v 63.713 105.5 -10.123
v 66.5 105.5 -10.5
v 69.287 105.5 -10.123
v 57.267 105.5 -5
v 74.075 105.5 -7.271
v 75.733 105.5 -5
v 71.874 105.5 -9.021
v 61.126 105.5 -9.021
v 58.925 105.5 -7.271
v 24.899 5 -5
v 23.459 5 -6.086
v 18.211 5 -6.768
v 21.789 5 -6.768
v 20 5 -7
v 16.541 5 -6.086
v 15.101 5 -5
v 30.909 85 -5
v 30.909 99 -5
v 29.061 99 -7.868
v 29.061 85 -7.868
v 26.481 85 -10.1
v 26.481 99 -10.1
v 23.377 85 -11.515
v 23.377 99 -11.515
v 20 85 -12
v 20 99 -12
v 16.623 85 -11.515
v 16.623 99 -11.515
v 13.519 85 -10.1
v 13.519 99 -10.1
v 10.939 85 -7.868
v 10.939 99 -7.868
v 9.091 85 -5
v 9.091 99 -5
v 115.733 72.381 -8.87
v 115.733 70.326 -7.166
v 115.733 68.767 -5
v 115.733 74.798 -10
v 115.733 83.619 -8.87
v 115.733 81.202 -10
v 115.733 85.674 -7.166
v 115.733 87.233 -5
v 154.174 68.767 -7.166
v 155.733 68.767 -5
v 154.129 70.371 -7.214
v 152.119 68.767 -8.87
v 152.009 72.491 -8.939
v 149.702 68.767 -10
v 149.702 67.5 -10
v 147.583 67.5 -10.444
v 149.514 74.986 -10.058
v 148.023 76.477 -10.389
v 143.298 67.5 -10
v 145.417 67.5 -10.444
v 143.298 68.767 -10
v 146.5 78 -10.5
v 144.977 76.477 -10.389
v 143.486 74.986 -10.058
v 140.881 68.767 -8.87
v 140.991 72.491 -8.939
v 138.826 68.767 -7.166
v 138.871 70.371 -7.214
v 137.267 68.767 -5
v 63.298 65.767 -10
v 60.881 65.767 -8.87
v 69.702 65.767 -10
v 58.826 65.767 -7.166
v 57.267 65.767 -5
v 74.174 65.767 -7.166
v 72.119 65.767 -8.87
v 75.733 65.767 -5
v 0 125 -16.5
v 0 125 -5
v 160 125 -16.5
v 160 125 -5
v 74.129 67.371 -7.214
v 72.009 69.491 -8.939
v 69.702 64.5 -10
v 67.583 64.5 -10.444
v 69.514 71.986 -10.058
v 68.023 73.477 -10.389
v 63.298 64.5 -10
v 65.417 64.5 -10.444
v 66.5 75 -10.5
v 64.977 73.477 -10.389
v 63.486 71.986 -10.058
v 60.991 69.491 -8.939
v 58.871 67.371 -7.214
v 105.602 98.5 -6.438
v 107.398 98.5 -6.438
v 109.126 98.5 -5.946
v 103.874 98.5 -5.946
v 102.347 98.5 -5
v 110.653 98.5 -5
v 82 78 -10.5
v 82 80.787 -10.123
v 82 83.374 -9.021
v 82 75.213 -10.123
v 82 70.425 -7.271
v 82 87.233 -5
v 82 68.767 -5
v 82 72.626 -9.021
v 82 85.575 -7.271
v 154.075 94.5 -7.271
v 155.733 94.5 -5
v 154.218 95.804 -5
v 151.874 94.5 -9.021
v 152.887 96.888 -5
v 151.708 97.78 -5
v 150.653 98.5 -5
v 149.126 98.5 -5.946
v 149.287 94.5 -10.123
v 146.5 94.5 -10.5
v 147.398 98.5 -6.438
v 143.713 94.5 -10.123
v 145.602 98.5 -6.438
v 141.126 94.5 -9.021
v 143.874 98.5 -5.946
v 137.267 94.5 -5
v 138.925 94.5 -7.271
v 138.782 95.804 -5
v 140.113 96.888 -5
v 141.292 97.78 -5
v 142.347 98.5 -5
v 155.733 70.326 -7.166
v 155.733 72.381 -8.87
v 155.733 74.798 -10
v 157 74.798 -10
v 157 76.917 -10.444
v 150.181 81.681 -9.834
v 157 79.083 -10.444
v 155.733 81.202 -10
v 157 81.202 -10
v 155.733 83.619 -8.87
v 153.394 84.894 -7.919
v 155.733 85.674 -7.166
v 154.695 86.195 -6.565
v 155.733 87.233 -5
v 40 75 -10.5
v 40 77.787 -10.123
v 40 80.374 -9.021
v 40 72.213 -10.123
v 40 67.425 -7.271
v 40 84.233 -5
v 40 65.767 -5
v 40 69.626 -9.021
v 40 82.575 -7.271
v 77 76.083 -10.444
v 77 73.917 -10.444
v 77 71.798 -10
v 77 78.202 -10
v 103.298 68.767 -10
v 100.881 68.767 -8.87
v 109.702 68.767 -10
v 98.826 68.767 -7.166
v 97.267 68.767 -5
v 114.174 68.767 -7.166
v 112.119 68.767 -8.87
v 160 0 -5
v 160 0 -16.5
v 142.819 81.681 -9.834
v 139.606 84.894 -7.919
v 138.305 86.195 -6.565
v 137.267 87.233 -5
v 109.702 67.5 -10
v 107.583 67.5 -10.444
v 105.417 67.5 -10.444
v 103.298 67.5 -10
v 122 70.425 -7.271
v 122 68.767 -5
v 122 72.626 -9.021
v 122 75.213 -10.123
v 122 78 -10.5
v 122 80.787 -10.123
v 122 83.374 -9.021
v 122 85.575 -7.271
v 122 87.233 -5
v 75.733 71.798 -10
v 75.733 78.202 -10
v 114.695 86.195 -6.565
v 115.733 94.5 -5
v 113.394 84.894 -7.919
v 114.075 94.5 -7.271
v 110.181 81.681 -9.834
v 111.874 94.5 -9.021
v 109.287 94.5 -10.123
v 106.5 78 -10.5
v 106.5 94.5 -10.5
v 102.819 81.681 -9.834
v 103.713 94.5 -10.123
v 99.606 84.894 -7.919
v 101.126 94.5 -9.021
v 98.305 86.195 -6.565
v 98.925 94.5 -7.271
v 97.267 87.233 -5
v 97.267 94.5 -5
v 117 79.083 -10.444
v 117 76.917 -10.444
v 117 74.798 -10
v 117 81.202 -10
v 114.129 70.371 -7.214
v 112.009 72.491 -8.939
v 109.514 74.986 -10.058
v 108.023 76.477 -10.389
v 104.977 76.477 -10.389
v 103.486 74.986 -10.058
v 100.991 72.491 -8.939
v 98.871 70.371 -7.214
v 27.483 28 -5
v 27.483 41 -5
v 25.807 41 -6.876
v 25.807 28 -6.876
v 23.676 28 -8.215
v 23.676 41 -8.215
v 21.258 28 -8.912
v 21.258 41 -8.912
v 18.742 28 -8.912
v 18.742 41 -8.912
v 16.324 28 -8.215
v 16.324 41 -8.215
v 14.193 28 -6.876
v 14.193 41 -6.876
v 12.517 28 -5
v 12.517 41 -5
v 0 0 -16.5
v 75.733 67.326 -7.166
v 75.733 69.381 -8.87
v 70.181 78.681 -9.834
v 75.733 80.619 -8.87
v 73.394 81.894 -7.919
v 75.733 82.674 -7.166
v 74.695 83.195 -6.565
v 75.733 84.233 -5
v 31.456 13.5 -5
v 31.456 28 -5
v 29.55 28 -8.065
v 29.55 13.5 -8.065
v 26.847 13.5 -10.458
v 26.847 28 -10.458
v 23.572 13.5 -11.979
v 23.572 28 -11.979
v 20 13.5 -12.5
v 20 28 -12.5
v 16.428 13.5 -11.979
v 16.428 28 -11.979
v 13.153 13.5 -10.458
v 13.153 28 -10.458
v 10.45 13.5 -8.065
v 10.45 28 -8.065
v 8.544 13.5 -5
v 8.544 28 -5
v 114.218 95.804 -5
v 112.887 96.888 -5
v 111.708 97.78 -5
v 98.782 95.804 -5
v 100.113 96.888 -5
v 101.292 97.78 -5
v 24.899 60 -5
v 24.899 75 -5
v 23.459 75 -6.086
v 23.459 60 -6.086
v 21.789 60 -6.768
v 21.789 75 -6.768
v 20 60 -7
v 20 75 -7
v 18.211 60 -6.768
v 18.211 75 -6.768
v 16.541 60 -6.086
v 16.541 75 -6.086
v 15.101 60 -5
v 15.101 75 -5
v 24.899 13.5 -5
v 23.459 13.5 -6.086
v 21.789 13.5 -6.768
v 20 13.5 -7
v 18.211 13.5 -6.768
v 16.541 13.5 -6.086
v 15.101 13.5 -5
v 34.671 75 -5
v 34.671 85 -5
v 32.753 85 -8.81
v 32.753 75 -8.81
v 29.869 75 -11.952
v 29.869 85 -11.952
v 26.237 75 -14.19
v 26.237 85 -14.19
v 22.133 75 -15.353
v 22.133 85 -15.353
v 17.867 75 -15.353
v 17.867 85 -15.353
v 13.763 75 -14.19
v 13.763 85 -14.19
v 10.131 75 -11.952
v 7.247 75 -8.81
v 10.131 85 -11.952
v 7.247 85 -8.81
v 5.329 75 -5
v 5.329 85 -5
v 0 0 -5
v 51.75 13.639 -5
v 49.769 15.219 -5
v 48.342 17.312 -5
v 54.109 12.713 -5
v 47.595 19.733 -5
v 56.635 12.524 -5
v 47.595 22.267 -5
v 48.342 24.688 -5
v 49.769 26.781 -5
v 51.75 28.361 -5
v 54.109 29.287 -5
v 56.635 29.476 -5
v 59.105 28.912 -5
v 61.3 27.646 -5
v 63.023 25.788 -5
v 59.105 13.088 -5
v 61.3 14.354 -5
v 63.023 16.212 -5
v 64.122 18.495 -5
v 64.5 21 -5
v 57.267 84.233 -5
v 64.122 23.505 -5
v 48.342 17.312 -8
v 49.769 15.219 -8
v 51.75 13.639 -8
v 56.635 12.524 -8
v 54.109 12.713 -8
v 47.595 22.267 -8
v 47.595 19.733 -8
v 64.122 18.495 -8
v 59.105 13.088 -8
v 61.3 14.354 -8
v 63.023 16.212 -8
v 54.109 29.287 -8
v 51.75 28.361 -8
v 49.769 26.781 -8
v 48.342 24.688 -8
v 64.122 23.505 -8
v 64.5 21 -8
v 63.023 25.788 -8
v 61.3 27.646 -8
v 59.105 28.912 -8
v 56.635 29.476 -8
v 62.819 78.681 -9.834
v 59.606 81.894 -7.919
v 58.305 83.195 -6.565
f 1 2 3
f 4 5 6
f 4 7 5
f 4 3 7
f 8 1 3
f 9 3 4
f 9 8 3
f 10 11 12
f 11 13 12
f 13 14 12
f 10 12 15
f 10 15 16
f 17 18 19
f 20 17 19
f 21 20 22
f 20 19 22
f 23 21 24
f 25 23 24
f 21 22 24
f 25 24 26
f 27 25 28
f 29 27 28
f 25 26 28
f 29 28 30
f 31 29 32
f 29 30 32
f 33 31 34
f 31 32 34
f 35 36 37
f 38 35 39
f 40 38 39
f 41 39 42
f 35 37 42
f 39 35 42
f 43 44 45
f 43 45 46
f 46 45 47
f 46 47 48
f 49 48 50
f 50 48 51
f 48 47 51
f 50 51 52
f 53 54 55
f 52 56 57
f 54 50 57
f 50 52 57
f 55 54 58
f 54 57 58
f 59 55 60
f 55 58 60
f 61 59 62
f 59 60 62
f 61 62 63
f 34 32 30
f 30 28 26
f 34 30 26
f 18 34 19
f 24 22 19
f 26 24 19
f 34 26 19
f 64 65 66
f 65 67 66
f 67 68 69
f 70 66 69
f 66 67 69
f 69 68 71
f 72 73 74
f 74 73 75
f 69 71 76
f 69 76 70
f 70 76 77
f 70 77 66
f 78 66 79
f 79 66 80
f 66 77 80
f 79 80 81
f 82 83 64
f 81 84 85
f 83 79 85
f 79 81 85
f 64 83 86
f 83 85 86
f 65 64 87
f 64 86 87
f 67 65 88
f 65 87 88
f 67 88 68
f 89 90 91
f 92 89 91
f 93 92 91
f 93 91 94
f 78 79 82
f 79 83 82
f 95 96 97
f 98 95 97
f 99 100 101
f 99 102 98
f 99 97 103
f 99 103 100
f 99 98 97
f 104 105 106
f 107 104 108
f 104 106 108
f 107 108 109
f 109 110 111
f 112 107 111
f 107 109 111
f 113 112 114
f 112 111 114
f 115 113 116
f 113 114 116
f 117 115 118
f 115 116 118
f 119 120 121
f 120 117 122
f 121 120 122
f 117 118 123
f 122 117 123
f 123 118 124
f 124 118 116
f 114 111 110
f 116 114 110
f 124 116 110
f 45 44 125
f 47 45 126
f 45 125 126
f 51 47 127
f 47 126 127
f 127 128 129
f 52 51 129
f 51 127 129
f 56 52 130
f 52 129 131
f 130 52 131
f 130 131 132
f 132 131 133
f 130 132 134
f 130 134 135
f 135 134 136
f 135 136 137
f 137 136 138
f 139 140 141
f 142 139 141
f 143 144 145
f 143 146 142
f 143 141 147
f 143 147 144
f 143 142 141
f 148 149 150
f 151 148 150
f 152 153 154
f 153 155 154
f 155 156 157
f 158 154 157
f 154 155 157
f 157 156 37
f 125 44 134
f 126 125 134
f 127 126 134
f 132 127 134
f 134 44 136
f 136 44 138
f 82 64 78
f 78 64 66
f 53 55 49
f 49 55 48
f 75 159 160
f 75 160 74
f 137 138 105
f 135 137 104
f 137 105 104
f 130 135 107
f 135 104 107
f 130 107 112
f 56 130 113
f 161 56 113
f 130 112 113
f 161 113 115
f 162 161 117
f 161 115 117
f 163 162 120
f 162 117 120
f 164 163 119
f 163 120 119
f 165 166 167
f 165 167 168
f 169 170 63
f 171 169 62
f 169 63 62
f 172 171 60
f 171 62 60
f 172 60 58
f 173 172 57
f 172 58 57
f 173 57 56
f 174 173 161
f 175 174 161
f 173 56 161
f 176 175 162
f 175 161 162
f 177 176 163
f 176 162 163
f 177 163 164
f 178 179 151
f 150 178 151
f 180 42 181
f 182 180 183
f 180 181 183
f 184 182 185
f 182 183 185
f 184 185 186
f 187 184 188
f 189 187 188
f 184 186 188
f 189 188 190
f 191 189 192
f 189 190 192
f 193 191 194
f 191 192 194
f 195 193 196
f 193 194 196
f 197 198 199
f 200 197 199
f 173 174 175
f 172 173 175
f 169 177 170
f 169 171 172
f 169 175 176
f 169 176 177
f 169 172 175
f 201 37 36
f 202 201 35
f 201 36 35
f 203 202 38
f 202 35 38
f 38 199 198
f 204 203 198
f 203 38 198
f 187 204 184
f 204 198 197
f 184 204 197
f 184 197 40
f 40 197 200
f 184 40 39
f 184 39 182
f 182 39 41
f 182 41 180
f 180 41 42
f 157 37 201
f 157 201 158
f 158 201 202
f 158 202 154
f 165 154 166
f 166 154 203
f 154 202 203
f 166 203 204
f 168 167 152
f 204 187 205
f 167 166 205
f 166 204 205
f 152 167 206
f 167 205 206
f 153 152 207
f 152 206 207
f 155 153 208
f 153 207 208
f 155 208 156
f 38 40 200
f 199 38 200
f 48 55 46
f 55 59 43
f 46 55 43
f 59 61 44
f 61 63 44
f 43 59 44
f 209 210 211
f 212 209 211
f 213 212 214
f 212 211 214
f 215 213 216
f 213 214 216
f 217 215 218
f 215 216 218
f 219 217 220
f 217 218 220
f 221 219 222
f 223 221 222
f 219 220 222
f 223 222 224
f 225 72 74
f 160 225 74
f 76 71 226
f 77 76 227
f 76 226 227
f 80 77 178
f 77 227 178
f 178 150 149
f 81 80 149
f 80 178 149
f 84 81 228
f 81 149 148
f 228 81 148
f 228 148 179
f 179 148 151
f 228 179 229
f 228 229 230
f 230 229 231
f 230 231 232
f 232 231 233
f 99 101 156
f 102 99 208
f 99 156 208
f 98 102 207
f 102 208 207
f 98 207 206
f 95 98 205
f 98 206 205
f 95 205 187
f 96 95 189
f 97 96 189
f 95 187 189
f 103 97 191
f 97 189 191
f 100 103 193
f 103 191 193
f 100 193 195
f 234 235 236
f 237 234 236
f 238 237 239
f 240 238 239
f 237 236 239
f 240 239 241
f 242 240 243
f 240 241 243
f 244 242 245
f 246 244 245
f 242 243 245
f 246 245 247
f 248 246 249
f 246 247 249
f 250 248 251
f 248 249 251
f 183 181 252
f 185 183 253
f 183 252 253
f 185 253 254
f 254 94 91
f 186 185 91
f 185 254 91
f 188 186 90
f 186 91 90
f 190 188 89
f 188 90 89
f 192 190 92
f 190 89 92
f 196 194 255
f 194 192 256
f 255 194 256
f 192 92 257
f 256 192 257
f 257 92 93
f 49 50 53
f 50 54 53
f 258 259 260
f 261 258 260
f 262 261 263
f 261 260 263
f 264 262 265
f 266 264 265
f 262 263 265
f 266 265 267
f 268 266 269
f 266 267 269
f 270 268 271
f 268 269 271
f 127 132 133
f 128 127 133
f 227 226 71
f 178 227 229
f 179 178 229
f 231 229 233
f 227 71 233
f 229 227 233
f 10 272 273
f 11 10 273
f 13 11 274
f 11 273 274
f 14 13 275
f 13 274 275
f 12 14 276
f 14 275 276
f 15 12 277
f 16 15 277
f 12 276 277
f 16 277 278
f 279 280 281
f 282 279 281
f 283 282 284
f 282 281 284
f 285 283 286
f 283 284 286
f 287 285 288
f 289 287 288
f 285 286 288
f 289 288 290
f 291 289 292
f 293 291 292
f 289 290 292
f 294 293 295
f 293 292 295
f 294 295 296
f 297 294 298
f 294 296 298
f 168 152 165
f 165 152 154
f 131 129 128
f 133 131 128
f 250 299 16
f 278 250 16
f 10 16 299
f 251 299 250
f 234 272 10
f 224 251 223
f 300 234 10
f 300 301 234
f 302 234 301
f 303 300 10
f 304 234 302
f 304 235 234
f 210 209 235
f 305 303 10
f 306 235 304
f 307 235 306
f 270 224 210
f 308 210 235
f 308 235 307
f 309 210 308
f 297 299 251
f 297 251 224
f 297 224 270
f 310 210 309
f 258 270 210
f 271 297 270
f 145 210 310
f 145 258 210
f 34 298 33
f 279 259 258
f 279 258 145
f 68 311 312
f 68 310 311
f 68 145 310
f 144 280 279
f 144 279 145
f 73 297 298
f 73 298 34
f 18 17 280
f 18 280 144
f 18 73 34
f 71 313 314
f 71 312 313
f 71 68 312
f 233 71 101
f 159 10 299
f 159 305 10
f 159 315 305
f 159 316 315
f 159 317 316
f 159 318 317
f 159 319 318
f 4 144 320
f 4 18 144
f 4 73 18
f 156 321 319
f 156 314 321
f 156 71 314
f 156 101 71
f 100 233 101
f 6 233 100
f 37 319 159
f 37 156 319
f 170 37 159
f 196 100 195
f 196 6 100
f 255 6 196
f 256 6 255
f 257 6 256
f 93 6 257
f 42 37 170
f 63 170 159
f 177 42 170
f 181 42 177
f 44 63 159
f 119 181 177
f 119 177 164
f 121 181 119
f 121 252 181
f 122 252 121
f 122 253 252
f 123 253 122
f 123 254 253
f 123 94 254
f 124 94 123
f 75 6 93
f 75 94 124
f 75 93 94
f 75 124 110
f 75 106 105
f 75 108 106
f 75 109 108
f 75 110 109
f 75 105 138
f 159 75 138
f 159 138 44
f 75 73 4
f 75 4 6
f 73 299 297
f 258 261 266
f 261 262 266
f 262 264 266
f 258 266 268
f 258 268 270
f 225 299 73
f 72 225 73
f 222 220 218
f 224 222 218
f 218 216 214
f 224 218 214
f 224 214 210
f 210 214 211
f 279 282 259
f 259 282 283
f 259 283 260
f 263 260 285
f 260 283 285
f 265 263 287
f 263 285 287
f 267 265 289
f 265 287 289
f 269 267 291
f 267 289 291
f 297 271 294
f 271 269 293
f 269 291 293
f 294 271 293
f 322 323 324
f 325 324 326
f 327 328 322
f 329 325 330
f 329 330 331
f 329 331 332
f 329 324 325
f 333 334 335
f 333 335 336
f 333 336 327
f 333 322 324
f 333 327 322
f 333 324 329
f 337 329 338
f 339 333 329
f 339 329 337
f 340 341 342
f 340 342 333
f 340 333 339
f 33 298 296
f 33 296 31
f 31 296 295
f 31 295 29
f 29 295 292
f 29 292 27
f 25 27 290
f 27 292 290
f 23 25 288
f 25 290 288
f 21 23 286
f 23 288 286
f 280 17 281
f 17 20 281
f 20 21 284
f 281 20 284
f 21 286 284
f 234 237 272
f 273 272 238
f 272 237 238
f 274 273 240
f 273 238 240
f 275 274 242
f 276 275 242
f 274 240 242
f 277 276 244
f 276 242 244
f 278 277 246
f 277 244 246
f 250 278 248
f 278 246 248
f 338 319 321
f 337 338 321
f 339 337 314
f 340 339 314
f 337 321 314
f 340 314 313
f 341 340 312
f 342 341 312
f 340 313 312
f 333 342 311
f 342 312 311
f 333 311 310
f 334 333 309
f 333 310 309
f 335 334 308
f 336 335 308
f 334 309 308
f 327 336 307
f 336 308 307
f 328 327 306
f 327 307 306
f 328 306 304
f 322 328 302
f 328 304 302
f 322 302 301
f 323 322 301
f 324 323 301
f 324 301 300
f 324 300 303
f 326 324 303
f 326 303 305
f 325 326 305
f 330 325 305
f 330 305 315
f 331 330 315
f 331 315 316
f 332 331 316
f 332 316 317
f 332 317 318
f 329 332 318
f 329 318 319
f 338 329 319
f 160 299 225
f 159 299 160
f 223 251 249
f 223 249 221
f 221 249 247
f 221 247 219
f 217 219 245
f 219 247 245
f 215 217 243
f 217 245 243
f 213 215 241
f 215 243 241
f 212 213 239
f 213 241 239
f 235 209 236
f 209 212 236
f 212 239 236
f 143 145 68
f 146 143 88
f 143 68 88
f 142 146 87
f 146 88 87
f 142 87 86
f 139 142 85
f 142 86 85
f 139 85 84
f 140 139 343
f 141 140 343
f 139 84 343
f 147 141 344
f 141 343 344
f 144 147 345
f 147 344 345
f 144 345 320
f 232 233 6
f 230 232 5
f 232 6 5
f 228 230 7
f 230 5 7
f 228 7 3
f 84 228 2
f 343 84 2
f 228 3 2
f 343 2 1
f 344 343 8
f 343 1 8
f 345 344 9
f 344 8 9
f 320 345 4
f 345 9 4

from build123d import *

# Parameters (mm, degrees)
F0_W      = 160
F0_H      = 125
F1_DEPTH  = 16.5
F4_W      = 37
F4_H      = 10.5
F6_W      = 10.5
F6_H      = 20
F6_H_2    = 21
F8_W      = 35
F8_H      = 10.5
F10_W     = 10.5
F10_H     = 21
F12_W     = 10.5
F12_H     = 21
F16_R     = 8.5
F17_DEPTH = 8
F18_W     = 160
F18_H     = 5
F19_DEPTH = 160
F20_W     = 1.2669073437
F20_H     = 18.4661853126
F20_W_2   = 18.4661853126
F20_H_2   = 1.2669073437
F21_DEPTH = 5


with BuildPart() as f1:
    # F0 (on Top) → F1 (new body)
    with BuildSketch(Plane.XY):
        with Locations((80, 62.5)):
            Rectangle(F0_W, F0_H)
    extrude(amount=-F1_DEPTH)

    # F2 (on face) → F3 (revolve, cut)
    with BuildSketch(Plane.XY):
        Polygon((20, 75), (20, 60), (27, 60), (27, 75), (35.5, 75), (35.5, 85), (32, 85), (32, 99), (24.5, 99), (24.5, 113), (20, 113), (20, 99), (20, 85), align=None)
    revolve(axis=Axis((20, 92, 0), (0, 1, 0)), mode=Mode.SUBTRACT)

    # F4 (on face) → F5 (revolve, cut)
    with BuildSketch(Plane.XY):
        with Locations((58.5, 69.75)):
            Rectangle(F4_W, F4_H)
    revolve(axis=Axis((58.5, 75, 0), (1, 0, 0)), mode=Mode.SUBTRACT)

    # F6 (on face) → F7 (revolve, cut)
    with BuildSketch(Plane.XY):
        with Locations((71.75, 95.5)):
            Rectangle(F6_W, F6_H)
        with Locations((71.75, 75)):
            Rectangle(F6_W, F6_H_2)
    revolve(axis=Axis((66.5, 85, 0), (0, 1, 0)), mode=Mode.SUBTRACT)

    # F8 (on face) → F9 (revolve, cut)
    with BuildSketch(Plane.XY):
        with Locations((99.5, 72.75)):
            Rectangle(F8_W, F8_H)
        with Locations((139.5, 72.75)):
            Rectangle(F8_W, F8_H)
    revolve(axis=Axis((99.5, 78, 0), (1, 0, 0)), mode=Mode.SUBTRACT)

    # F10 (on face) → F11 (revolve, cut)
    with BuildSketch(Plane.XY):
        Polygon((106.5, 88.5), (117, 88.5), (117, 94.5), (113, 98.5), (106.5, 98.5), align=None)
        with Locations((111.75, 78)):
            Rectangle(F10_W, F10_H)
    revolve(axis=Axis((106.5, 83, 0), (0, 1, 0)), mode=Mode.SUBTRACT)

    # F12 (on face) → F13 (revolve, cut)
    with BuildSketch(Plane.XY):
        Polygon((146.5, 88.5), (157, 88.5), (157, 94.5), (153, 98.5), (146.5, 98.5), align=None)
        with Locations((151.75, 78)):
            Rectangle(F12_W, F12_H)
    revolve(axis=Axis((146.5, 83, 0), (0, 1, 0)), mode=Mode.SUBTRACT)

    # F14 (on face) → F15 (revolve, cut)
    with BuildSketch(Plane.XY):
        Polygon((20, 13.5), (20, 5), (27, 5), (27, 13.5), (32.5, 13.5), (32.5, 28), (29, 28), (29, 41), (20, 41), (20, 28), align=None)
    revolve(axis=Axis((20, 20.75, 0), (0, 1, 0)), mode=Mode.SUBTRACT)

    # F16 (on face) → F17 (cut)
    with BuildSketch(Plane.XY):
        with Locations((56, 21)):
            Circle(F16_R)
    extrude(amount=-F17_DEPTH, mode=Mode.SUBTRACT)

    # F18 (on face) → F19 (cut)
    with BuildSketch(Plane.XZ):
        with Locations((80, -2.5)):
            Rectangle(F18_W, F18_H)
    extrude(amount=-F19_DEPTH, mode=Mode.SUBTRACT)

    # F20 (on face) → F21 (join)
    with BuildSketch(Plane.XY.offset(-5)):
        with Locations((76.3665463282, 75)):
            Rectangle(F20_W, F20_H)
        with Locations((66.5, 65.1334536718)):
            Rectangle(F20_W_2, F20_H_2)
        with Locations((116.3665463282, 78)):
            Rectangle(F20_W, F20_H)
        with Locations((106.5, 68.1334536718)):
            Rectangle(F20_W_2, F20_H_2)
        with Locations((156.3665463282, 78)):
            Rectangle(F20_W, F20_H)
        with Locations((146.5, 68.1334536718)):
            Rectangle(F20_W_2, F20_H_2)
    extrude(amount=-F21_DEPTH)


solid = f1.part
